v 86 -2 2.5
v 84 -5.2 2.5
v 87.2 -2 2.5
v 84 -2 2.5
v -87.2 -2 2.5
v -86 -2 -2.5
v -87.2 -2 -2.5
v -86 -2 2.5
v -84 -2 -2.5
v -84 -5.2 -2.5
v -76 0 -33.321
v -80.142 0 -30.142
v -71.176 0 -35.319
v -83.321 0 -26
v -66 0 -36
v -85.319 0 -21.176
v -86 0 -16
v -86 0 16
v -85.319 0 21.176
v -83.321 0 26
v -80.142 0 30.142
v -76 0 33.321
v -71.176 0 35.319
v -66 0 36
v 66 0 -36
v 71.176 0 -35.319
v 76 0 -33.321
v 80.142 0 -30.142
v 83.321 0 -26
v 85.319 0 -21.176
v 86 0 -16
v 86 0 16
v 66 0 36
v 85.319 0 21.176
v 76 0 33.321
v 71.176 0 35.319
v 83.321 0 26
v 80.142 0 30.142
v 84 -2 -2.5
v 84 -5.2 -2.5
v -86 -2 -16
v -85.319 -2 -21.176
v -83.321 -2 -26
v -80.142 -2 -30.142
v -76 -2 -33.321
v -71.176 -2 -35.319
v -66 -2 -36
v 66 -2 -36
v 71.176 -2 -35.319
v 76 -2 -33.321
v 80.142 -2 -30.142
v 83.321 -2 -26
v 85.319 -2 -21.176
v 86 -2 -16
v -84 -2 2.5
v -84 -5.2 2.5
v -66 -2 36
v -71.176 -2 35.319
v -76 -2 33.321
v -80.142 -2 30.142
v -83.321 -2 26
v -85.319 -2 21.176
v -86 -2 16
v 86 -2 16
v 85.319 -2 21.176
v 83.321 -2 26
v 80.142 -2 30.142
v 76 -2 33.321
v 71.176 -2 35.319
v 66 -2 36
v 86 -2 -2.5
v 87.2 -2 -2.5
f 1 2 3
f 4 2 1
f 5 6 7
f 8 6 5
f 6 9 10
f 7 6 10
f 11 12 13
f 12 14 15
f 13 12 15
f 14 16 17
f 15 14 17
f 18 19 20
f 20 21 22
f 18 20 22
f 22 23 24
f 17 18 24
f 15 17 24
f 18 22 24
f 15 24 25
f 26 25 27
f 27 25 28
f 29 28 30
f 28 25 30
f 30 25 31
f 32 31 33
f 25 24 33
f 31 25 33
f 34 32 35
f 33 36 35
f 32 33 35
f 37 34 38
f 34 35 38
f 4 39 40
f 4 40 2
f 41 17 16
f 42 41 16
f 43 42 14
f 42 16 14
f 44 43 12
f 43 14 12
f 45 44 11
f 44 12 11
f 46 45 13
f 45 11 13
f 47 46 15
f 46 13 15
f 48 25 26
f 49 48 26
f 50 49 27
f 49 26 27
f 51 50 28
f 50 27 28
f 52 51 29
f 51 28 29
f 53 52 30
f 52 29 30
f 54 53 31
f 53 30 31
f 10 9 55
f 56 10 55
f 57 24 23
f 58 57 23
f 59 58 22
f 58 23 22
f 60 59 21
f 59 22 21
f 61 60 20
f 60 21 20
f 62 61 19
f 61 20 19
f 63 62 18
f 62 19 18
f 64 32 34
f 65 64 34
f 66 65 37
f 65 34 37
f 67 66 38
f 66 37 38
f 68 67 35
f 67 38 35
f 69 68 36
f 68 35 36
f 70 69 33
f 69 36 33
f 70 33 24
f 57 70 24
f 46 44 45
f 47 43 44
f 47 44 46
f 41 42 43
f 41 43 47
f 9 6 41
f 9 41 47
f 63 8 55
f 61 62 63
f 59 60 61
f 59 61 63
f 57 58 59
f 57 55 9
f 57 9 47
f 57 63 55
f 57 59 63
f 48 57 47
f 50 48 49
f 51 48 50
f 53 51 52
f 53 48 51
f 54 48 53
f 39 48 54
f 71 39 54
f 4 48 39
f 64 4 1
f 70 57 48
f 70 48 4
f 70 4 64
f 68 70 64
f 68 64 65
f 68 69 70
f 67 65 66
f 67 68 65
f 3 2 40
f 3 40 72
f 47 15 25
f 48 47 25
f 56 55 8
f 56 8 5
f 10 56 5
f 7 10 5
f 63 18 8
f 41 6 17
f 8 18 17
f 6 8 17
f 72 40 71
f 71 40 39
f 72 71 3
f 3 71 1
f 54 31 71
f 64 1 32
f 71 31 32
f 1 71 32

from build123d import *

# Parameters (mm, degrees)
F1_DEPTH    = 2
F0_W        = 2
F0_H        = 5
F2_DEPTH    = 6
F3_W        = 4
F3_H        = 5
F4_DEPTH    = 1.2
F5_W        = 4
F5_H        = 5
F6_DEPTH    = 1.2
F7_T1_DEPTH = 25.5734639037


# Not quite as in the source:
# - a fillet or chamfer that OpenCascade refuses, or shapes differently, is made with other operations: its cross-section is extruded or revolved along the edge and cut away or added


with BuildPart() as f1:
    # F0 (on Front) → F1 (new body)
    with BuildSketch(Plane.XZ):
        with BuildLine():
            ThreePointArc((86, 16), (80.1421356237, 30.1421356237), (66, 36))
            Line((66, 36), (-66, 36))
            ThreePointArc((-66, 36), (-80.1421356237, 30.1421356237), (-86, 16))
            Line((-86, 16), (-86, 2.5))
            Line((-86, 2.5), (-84, 2.5))
            Line((-84, 2.5), (-84, -2.5))
            Line((-84, -2.5), (-86, -2.5))
            Line((-86, -2.5), (-86, -16))
            ThreePointArc((-86, -16), (-80.1421356237, -30.1421356237), (-66, -36))
            Line((-66, -36), (66, -36))
            ThreePointArc((66, -36), (80.1421356237, -30.1421356237), (86, -16))
            Line((86, -16), (86, -2.5))
            Line((86, -2.5), (84, -2.5))
            Line((84, -2.5), (84, 2.5))
            Line((84, 2.5), (86, 2.5))
            Line((86, 2.5), (86, 16))
        make_face()
    extrude(amount=F1_DEPTH)

    # F0 (on Front) → F2 (join)
    with BuildSketch(Plane.XZ):
        with Locations((85, 0)):
            Rectangle(F0_W, F0_H)
        with Locations((-85, 0)):
            Rectangle(F0_W, F0_H)
    extrude(amount=F2_DEPTH)

    # F3 (on face) → F4 (join)
    with BuildSketch(Plane(origin=(-86, 0, 0), x_dir=(0, -1, 0), z_dir=(-1, 0, 0))):
        with Locations((4, 0)):
            Rectangle(F3_W, F3_H)
    extrude(amount=F4_DEPTH)

    # F5 (on face) → F6 (join)
    with BuildSketch(Plane.YZ.offset(86)):
        with Locations((-4, 0)):
            Rectangle(F5_W, F5_H)
    extrude(amount=F6_DEPTH)

    # F7: chamfer of 4 on 2 edges, made by hand

    # F7_s2 → F7_t1 (cut)
    with BuildSketch(Plane.XY.offset(-12.7867319519)):
        Polygon((83.2, -6), (87.2, -2), (87.2, -6), align=None)
        Polygon((-83.2, -6), (-87.2, -2), (-87.2, -6), align=None)
    extrude(amount=F7_T1_DEPTH, mode=Mode.SUBTRACT)


solid = f1.part
